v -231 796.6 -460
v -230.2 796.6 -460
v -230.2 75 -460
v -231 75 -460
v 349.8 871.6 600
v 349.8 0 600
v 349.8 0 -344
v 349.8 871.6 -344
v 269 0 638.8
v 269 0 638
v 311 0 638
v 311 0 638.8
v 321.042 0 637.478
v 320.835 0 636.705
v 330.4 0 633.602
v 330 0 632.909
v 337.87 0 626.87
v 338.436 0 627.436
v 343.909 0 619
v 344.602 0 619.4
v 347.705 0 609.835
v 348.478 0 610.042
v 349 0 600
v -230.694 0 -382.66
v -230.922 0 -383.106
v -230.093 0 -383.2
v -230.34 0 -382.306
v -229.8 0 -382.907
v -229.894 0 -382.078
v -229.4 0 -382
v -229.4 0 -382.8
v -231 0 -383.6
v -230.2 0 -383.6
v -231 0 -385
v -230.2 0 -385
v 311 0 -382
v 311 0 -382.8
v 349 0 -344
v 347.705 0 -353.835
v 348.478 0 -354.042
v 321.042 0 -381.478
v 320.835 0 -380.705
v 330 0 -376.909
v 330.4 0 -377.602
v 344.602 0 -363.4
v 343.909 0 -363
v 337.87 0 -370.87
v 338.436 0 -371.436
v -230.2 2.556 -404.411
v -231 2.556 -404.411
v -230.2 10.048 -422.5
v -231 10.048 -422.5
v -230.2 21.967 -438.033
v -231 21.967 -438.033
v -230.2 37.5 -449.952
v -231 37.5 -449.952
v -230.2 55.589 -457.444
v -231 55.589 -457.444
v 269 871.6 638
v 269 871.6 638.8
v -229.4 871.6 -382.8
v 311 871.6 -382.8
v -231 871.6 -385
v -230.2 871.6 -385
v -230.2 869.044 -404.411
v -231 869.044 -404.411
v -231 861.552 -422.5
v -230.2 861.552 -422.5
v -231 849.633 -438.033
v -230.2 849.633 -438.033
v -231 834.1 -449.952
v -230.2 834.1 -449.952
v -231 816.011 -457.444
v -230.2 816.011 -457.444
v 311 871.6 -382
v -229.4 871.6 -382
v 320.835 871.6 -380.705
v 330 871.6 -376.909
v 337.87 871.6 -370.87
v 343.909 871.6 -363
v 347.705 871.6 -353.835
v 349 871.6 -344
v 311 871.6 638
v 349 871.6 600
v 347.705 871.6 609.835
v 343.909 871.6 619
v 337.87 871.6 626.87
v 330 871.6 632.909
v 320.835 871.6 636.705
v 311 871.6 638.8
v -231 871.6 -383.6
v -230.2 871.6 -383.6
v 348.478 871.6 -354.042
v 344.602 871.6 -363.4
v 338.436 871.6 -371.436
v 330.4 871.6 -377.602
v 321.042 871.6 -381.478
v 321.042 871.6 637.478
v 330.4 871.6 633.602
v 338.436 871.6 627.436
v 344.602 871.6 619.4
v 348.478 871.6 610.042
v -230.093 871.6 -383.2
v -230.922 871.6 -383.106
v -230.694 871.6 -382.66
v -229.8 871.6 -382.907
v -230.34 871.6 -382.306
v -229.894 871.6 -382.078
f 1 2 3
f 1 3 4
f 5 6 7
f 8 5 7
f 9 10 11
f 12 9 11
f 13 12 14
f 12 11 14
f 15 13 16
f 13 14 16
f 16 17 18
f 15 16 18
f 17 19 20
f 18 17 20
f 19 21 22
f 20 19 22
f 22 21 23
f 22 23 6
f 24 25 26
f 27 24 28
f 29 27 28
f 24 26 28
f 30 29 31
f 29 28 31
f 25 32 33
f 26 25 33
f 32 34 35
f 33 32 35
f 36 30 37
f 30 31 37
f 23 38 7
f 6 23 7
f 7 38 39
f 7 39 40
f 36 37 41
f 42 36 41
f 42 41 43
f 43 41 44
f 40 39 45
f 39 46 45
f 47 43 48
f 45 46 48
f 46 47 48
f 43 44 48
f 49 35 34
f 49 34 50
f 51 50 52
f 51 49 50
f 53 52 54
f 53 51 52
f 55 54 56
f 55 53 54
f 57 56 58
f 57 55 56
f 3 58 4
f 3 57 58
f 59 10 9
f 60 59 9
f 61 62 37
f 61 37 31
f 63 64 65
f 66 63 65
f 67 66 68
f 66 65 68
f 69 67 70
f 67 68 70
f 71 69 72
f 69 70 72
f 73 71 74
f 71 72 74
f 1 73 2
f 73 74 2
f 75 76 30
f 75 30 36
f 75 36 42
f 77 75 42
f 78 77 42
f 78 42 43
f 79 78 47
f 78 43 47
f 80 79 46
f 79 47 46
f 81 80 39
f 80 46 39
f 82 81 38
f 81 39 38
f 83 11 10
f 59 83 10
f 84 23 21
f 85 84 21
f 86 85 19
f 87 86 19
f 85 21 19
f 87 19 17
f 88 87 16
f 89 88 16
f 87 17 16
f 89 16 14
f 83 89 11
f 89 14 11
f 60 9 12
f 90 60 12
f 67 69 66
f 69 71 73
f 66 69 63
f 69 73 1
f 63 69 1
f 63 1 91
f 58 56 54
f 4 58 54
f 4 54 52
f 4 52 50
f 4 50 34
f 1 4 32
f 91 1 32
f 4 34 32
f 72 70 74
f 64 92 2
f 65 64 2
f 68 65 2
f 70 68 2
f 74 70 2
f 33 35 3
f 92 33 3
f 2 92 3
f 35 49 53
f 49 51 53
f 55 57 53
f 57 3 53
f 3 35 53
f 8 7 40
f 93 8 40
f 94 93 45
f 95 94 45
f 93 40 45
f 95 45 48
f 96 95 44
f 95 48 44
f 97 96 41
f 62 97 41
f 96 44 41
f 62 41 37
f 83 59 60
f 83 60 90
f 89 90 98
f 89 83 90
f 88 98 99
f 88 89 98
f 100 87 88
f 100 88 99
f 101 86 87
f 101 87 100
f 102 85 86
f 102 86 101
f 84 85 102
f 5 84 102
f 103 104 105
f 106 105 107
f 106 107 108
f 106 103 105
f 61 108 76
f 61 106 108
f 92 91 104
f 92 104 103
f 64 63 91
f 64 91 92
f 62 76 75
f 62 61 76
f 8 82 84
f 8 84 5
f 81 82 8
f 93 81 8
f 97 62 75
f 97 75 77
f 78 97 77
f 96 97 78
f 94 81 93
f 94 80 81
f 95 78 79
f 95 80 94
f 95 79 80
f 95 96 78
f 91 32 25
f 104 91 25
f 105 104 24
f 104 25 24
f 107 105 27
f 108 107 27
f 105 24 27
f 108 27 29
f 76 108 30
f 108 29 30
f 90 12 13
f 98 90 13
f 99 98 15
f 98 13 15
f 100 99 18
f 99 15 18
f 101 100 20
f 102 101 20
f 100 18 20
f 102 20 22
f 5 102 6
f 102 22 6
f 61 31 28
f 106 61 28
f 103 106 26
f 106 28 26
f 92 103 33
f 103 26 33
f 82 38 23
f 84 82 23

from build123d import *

# Parameters (mm, degrees)
BASE_FLANGE1_DEPTH = 871.6
CUT_EXTRUDE1_DEPTH = 10


# Sheet-metal steps are written as plain solids
with BuildPart() as part:
    # Sketch1 → Base-Flange1 (new body)
    with BuildSketch(Plane(origin=(0, 0, 0), x_dir=(1, 0, 0), z_dir=(0, 1, 0))):
        with BuildLine():
            Line((-231, 460), (-231, 383.6))
            ThreePointArc((-231, 383.6), (-230.53137085, 382.46862915), (-229.4, 382))
            Line((-229.4, 382), (311, 382))
            ThreePointArc((311, 382), (337.870057685, 370.870057685), (349, 344))
            Line((349, 344), (349, -600))
            ThreePointArc((349, -600), (337.870057685, -626.870057685), (311, -638))
            Line((311, -638), (269, -638))
            Line((269, -638), (269, -638.8))
            Line((269, -638.8), (311, -638.8))
            ThreePointArc((311, -638.8), (338.43574311, -627.43574311), (349.8, -600))
            Line((349.8, -600), (349.8, 344))
            ThreePointArc((349.8, 344), (338.43574311, 371.43574311), (311, 382.8))
            Line((311, 382.8), (-229.4, 382.8))
            ThreePointArc((-229.4, 382.8), (-229.965685425, 383.034314575), (-230.2, 383.6))
            Line((-230.2, 383.6), (-230.2, 460))
            Line((-230.2, 460), (-231, 460))
        make_face()
    extrude(amount=BASE_FLANGE1_DEPTH)

    # Sketch4 → Cut-Extrude1 (cut)
    with BuildSketch(Plane(origin=(-230.2, 0, 0), x_dir=(0, 0, -1), z_dir=(1, 0, 0))):
        with BuildLine():
            Line((460, 871.6), (385, 871.6))
            ThreePointArc((385, 871.6), (438.033008589, 849.633008589), (460, 796.6))
            Line((460, 796.6), (460, 871.6))
        make_face()
        with BuildLine():
            Line((460, 0), (385, 0))
            ThreePointArc((385, 0), (438.033008589, 21.966991411), (460, 75))
            Line((460, 75), (460, 0))
        make_face()
    extrude(amount=-CUT_EXTRUDE1_DEPTH, mode=Mode.SUBTRACT)


solid = part.part
